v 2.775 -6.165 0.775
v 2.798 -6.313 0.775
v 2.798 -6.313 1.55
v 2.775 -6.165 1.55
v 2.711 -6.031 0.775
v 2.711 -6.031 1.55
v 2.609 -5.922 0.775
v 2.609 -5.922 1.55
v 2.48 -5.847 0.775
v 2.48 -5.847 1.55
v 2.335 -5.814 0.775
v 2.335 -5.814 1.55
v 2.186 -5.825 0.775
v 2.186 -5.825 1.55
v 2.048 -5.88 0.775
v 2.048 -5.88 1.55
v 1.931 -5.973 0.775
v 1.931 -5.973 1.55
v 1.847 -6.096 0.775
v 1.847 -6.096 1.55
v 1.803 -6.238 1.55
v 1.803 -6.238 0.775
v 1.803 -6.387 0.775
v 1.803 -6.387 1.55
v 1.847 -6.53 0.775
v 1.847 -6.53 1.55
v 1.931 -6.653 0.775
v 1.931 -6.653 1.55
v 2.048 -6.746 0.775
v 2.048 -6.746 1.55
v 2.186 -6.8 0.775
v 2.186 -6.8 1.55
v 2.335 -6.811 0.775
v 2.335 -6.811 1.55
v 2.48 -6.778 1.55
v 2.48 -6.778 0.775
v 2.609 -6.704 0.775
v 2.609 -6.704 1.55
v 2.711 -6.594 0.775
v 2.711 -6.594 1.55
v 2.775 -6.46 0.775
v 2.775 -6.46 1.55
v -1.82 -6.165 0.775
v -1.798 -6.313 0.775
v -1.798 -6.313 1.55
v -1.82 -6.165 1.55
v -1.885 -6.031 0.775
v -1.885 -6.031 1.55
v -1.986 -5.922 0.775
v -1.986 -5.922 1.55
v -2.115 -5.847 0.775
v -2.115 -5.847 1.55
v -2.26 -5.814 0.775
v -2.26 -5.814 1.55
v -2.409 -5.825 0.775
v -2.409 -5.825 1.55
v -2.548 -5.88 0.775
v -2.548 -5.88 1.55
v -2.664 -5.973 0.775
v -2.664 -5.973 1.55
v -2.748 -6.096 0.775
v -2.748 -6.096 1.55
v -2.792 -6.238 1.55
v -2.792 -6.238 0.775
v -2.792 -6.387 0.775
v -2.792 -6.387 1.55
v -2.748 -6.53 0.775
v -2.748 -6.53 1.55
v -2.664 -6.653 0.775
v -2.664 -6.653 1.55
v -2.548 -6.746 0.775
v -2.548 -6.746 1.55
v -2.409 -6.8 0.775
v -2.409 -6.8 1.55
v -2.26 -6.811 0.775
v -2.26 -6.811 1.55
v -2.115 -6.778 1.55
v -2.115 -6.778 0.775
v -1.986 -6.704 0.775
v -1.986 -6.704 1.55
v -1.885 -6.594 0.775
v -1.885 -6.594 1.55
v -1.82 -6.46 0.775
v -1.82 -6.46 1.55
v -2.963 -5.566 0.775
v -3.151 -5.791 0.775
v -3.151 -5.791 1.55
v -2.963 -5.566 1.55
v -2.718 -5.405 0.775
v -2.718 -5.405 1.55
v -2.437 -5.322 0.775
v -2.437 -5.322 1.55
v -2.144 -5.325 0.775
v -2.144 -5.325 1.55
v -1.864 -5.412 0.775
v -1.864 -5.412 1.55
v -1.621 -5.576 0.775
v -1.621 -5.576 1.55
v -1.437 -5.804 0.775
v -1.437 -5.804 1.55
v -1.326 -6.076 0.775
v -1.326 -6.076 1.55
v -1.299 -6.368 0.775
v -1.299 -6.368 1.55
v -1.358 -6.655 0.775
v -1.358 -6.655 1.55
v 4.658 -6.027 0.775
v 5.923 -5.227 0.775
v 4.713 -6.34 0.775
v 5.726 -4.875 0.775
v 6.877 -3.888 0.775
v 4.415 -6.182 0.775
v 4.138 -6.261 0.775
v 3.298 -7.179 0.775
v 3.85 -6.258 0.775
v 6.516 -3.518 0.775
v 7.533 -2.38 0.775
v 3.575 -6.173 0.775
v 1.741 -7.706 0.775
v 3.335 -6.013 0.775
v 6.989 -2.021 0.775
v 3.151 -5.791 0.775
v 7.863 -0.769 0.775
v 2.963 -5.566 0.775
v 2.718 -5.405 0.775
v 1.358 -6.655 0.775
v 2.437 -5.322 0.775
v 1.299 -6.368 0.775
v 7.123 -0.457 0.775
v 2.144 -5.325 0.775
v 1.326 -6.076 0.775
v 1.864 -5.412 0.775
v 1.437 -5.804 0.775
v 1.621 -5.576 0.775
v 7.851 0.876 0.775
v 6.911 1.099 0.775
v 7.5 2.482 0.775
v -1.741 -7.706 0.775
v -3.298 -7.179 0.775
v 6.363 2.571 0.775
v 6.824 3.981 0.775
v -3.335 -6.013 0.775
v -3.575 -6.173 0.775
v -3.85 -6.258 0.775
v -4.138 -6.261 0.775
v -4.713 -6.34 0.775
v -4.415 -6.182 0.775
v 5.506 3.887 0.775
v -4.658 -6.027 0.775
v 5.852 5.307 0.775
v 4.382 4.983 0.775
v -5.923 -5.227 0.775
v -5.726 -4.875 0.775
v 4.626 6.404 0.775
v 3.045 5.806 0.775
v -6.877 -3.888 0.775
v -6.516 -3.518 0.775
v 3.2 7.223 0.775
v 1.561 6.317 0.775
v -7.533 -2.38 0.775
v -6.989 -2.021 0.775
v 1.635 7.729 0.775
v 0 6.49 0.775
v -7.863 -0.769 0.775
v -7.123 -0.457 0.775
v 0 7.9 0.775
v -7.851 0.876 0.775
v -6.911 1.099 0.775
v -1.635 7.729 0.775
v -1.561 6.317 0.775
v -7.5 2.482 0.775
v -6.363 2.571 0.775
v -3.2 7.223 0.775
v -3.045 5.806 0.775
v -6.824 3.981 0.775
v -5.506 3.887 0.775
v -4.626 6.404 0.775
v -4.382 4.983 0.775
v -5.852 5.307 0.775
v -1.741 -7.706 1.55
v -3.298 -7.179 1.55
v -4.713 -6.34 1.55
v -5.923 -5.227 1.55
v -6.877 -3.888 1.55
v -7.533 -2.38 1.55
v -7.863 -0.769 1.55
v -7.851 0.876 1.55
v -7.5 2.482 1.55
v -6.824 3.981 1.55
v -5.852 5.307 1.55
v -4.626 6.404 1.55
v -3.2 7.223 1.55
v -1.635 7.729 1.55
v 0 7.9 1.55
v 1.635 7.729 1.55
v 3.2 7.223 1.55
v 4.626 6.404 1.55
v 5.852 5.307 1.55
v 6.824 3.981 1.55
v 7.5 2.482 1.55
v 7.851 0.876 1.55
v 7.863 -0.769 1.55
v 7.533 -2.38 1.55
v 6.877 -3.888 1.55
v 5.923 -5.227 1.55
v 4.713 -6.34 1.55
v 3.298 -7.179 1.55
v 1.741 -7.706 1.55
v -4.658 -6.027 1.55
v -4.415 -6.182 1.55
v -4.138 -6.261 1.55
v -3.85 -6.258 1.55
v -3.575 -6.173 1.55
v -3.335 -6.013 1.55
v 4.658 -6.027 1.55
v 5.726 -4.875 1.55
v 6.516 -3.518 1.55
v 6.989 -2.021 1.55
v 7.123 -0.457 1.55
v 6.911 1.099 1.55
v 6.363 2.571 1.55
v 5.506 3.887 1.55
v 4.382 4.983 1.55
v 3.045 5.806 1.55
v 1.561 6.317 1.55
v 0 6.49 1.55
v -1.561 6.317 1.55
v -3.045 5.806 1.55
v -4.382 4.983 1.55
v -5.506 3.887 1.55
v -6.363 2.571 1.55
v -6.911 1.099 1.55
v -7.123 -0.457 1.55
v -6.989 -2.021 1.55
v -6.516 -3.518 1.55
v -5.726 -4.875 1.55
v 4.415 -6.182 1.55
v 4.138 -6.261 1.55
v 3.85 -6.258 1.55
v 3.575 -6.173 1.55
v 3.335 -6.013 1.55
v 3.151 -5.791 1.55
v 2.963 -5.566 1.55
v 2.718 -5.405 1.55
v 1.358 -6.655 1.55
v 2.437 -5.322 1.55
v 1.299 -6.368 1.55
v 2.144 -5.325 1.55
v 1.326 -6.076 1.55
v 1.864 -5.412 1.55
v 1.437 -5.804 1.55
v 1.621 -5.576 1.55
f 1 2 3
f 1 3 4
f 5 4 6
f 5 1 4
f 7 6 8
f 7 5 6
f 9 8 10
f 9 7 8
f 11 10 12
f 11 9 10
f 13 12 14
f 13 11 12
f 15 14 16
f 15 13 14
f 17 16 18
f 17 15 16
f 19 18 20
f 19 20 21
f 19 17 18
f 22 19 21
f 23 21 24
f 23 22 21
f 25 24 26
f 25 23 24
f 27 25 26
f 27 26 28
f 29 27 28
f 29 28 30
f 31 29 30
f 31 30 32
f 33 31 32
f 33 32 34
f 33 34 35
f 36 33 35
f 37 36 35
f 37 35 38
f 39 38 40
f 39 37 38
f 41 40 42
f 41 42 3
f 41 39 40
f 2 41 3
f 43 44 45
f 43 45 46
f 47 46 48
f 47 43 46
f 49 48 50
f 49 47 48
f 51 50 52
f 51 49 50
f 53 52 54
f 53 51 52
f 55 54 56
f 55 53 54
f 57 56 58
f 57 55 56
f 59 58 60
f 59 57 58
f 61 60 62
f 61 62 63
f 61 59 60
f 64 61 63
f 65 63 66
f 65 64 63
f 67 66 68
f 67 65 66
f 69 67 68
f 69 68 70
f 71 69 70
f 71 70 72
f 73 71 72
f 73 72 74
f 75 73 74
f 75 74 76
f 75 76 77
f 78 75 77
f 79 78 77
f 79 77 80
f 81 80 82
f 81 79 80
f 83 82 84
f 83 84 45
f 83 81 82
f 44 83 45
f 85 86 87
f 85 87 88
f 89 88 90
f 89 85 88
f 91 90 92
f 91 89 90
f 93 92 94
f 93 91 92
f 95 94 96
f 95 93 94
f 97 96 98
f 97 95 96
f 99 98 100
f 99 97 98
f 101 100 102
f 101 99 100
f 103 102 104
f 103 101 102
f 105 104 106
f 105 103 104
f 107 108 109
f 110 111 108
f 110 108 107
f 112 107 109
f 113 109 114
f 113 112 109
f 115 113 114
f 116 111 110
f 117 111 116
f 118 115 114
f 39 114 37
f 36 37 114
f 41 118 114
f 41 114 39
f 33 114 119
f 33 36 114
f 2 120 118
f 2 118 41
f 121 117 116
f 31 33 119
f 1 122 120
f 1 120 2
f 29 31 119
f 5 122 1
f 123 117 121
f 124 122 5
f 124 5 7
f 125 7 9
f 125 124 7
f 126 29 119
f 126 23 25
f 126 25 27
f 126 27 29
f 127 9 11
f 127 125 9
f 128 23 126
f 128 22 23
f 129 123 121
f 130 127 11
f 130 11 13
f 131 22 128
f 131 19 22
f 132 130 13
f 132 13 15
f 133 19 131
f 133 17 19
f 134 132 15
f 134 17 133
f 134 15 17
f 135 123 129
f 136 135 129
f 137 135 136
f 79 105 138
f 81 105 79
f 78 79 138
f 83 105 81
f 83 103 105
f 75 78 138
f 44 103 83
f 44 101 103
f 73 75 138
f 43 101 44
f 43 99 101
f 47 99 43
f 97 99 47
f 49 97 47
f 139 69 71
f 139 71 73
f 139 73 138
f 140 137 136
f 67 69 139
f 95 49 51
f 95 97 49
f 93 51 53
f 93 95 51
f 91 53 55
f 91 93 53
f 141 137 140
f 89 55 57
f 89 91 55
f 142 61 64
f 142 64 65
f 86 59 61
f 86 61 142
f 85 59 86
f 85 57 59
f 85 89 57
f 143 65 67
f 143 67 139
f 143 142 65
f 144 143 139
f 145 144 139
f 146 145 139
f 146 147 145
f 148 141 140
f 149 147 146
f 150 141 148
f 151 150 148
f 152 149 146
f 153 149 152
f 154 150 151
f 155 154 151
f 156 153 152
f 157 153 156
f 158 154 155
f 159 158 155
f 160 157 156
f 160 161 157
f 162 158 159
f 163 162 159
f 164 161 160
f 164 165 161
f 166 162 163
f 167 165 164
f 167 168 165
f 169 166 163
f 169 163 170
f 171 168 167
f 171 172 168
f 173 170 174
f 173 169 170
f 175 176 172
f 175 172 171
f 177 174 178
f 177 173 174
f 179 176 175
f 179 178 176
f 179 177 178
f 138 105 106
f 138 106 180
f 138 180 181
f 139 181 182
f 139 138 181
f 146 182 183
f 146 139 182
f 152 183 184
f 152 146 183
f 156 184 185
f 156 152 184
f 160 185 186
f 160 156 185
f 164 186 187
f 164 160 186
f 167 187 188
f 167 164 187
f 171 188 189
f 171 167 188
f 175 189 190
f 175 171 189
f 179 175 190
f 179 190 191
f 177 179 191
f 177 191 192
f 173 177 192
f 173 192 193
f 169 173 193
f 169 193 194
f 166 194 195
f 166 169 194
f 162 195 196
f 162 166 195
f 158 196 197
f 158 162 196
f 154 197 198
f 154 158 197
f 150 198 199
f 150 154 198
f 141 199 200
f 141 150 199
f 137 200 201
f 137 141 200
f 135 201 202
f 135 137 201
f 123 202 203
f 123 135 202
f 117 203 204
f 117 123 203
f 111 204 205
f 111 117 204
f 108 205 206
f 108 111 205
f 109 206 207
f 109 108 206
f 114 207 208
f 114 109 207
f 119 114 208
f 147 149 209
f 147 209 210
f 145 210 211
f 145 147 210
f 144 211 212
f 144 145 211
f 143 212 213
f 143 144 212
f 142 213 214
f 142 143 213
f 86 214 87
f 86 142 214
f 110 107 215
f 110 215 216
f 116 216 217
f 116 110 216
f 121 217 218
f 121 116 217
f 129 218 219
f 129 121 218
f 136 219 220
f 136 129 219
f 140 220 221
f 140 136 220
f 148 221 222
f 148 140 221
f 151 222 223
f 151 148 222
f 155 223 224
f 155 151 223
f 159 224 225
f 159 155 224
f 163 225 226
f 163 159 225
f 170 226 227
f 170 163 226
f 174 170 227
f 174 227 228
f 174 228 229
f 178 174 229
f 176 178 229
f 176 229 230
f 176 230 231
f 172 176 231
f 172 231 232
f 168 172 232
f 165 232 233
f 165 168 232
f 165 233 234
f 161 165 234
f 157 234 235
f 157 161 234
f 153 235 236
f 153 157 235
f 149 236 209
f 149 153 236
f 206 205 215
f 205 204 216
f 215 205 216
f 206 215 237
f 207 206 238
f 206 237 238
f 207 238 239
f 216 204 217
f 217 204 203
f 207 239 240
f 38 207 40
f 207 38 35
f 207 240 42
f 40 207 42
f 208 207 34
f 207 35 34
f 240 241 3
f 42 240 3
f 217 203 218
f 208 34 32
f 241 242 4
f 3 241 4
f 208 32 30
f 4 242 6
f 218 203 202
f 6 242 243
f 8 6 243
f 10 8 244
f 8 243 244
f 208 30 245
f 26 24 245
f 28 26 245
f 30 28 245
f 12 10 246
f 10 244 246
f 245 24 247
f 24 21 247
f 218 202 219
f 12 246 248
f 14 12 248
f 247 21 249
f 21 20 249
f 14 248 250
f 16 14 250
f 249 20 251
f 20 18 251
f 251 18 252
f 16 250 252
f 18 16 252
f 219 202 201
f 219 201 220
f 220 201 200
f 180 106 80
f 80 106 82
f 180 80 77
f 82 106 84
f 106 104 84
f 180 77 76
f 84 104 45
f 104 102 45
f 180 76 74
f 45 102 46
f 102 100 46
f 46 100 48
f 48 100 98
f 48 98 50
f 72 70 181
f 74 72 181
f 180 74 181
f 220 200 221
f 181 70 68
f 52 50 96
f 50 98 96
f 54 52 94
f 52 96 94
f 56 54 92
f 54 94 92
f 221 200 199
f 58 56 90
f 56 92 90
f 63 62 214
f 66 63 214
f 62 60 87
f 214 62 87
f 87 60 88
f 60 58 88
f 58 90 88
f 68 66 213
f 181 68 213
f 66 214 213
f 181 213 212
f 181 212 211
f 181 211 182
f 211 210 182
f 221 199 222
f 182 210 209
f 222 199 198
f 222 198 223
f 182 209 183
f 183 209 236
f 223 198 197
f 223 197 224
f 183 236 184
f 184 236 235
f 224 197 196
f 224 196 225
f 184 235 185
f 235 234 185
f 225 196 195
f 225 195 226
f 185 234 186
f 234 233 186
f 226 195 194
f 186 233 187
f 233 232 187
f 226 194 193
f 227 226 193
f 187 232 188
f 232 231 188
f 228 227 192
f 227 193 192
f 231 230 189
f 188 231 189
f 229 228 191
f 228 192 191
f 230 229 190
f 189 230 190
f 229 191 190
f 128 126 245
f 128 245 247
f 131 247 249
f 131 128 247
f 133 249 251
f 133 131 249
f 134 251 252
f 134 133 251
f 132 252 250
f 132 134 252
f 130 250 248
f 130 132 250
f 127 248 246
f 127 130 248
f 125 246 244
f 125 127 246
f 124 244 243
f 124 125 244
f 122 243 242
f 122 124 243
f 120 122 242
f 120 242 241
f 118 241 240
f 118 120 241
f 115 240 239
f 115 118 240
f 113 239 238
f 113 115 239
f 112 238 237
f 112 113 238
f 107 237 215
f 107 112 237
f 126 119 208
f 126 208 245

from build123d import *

# Parameters (mm, degrees)
SKETCH1_R                 = 7.9
EXTRUDE1_DEPTH            = 0.775
SKETCH34_R                = 0.5
F_056_250_SNAP_RING_DEPTH = 0.775
SKETCH35_R                = 7.9
CUT_EXTRUDE1_DEPTH        = 0.775


with BuildPart() as part:
    # Sketch1 → Extrude1 (new body)
    with BuildSketch(Plane.XY):
        with Locations(Location((0, 0, 0), (0, 0, 180))):
            Circle(SKETCH1_R)
    extrude(amount=EXTRUDE1_DEPTH)

    # Sketch34 → 056-250 Snap Ring (add)
    with BuildSketch(Plane.XY.offset(0.775)):
        with BuildLine():
            Line((-1.357948468, -6.654737152), (-1.740532253, -7.705877463))
            ThreePointArc((-1.740532253, -7.705877463), (0, 7.9), (1.740532253, -7.705877463))
            Line((1.740532253, -7.705877463), (1.357948468, -6.654737152))
            ThreePointArc((1.357948468, -6.654737152), (1.863757747, -5.411747949), (3.15093243, -5.791282558))
            ThreePointArc((3.15093243, -5.791282558), (3.849974822, -6.257880122), (4.657974592, -6.026558003))
            ThreePointArc((4.657974592, -6.026558003), (0, 6.49), (-4.657974592, -6.026558003))
            ThreePointArc((-4.657974592, -6.026558003), (-3.849974822, -6.257880122), (-3.15093243, -5.791282558))
            ThreePointArc((-3.15093243, -5.791282558), (-1.863757747, -5.411747949), (-1.357948468, -6.654737152))
        make_face()
        with Locations((2.297641088, -6.312717009)):
            Circle(SKETCH34_R, mode=Mode.SUBTRACT)
        with Locations((-2.297641088, -6.312717009)):
            Circle(SKETCH34_R, mode=Mode.SUBTRACT)
    extrude(amount=F_056_250_SNAP_RING_DEPTH)

    # Sketch35 → Cut-Extrude1 (cut)
    with BuildSketch(Plane(origin=(0, 0, 0), x_dir=(-1, 0, 0), z_dir=(0, 0, -1))):
        Circle(SKETCH35_R)
    extrude(amount=-CUT_EXTRUDE1_DEPTH, mode=Mode.SUBTRACT)


solid = part.part
